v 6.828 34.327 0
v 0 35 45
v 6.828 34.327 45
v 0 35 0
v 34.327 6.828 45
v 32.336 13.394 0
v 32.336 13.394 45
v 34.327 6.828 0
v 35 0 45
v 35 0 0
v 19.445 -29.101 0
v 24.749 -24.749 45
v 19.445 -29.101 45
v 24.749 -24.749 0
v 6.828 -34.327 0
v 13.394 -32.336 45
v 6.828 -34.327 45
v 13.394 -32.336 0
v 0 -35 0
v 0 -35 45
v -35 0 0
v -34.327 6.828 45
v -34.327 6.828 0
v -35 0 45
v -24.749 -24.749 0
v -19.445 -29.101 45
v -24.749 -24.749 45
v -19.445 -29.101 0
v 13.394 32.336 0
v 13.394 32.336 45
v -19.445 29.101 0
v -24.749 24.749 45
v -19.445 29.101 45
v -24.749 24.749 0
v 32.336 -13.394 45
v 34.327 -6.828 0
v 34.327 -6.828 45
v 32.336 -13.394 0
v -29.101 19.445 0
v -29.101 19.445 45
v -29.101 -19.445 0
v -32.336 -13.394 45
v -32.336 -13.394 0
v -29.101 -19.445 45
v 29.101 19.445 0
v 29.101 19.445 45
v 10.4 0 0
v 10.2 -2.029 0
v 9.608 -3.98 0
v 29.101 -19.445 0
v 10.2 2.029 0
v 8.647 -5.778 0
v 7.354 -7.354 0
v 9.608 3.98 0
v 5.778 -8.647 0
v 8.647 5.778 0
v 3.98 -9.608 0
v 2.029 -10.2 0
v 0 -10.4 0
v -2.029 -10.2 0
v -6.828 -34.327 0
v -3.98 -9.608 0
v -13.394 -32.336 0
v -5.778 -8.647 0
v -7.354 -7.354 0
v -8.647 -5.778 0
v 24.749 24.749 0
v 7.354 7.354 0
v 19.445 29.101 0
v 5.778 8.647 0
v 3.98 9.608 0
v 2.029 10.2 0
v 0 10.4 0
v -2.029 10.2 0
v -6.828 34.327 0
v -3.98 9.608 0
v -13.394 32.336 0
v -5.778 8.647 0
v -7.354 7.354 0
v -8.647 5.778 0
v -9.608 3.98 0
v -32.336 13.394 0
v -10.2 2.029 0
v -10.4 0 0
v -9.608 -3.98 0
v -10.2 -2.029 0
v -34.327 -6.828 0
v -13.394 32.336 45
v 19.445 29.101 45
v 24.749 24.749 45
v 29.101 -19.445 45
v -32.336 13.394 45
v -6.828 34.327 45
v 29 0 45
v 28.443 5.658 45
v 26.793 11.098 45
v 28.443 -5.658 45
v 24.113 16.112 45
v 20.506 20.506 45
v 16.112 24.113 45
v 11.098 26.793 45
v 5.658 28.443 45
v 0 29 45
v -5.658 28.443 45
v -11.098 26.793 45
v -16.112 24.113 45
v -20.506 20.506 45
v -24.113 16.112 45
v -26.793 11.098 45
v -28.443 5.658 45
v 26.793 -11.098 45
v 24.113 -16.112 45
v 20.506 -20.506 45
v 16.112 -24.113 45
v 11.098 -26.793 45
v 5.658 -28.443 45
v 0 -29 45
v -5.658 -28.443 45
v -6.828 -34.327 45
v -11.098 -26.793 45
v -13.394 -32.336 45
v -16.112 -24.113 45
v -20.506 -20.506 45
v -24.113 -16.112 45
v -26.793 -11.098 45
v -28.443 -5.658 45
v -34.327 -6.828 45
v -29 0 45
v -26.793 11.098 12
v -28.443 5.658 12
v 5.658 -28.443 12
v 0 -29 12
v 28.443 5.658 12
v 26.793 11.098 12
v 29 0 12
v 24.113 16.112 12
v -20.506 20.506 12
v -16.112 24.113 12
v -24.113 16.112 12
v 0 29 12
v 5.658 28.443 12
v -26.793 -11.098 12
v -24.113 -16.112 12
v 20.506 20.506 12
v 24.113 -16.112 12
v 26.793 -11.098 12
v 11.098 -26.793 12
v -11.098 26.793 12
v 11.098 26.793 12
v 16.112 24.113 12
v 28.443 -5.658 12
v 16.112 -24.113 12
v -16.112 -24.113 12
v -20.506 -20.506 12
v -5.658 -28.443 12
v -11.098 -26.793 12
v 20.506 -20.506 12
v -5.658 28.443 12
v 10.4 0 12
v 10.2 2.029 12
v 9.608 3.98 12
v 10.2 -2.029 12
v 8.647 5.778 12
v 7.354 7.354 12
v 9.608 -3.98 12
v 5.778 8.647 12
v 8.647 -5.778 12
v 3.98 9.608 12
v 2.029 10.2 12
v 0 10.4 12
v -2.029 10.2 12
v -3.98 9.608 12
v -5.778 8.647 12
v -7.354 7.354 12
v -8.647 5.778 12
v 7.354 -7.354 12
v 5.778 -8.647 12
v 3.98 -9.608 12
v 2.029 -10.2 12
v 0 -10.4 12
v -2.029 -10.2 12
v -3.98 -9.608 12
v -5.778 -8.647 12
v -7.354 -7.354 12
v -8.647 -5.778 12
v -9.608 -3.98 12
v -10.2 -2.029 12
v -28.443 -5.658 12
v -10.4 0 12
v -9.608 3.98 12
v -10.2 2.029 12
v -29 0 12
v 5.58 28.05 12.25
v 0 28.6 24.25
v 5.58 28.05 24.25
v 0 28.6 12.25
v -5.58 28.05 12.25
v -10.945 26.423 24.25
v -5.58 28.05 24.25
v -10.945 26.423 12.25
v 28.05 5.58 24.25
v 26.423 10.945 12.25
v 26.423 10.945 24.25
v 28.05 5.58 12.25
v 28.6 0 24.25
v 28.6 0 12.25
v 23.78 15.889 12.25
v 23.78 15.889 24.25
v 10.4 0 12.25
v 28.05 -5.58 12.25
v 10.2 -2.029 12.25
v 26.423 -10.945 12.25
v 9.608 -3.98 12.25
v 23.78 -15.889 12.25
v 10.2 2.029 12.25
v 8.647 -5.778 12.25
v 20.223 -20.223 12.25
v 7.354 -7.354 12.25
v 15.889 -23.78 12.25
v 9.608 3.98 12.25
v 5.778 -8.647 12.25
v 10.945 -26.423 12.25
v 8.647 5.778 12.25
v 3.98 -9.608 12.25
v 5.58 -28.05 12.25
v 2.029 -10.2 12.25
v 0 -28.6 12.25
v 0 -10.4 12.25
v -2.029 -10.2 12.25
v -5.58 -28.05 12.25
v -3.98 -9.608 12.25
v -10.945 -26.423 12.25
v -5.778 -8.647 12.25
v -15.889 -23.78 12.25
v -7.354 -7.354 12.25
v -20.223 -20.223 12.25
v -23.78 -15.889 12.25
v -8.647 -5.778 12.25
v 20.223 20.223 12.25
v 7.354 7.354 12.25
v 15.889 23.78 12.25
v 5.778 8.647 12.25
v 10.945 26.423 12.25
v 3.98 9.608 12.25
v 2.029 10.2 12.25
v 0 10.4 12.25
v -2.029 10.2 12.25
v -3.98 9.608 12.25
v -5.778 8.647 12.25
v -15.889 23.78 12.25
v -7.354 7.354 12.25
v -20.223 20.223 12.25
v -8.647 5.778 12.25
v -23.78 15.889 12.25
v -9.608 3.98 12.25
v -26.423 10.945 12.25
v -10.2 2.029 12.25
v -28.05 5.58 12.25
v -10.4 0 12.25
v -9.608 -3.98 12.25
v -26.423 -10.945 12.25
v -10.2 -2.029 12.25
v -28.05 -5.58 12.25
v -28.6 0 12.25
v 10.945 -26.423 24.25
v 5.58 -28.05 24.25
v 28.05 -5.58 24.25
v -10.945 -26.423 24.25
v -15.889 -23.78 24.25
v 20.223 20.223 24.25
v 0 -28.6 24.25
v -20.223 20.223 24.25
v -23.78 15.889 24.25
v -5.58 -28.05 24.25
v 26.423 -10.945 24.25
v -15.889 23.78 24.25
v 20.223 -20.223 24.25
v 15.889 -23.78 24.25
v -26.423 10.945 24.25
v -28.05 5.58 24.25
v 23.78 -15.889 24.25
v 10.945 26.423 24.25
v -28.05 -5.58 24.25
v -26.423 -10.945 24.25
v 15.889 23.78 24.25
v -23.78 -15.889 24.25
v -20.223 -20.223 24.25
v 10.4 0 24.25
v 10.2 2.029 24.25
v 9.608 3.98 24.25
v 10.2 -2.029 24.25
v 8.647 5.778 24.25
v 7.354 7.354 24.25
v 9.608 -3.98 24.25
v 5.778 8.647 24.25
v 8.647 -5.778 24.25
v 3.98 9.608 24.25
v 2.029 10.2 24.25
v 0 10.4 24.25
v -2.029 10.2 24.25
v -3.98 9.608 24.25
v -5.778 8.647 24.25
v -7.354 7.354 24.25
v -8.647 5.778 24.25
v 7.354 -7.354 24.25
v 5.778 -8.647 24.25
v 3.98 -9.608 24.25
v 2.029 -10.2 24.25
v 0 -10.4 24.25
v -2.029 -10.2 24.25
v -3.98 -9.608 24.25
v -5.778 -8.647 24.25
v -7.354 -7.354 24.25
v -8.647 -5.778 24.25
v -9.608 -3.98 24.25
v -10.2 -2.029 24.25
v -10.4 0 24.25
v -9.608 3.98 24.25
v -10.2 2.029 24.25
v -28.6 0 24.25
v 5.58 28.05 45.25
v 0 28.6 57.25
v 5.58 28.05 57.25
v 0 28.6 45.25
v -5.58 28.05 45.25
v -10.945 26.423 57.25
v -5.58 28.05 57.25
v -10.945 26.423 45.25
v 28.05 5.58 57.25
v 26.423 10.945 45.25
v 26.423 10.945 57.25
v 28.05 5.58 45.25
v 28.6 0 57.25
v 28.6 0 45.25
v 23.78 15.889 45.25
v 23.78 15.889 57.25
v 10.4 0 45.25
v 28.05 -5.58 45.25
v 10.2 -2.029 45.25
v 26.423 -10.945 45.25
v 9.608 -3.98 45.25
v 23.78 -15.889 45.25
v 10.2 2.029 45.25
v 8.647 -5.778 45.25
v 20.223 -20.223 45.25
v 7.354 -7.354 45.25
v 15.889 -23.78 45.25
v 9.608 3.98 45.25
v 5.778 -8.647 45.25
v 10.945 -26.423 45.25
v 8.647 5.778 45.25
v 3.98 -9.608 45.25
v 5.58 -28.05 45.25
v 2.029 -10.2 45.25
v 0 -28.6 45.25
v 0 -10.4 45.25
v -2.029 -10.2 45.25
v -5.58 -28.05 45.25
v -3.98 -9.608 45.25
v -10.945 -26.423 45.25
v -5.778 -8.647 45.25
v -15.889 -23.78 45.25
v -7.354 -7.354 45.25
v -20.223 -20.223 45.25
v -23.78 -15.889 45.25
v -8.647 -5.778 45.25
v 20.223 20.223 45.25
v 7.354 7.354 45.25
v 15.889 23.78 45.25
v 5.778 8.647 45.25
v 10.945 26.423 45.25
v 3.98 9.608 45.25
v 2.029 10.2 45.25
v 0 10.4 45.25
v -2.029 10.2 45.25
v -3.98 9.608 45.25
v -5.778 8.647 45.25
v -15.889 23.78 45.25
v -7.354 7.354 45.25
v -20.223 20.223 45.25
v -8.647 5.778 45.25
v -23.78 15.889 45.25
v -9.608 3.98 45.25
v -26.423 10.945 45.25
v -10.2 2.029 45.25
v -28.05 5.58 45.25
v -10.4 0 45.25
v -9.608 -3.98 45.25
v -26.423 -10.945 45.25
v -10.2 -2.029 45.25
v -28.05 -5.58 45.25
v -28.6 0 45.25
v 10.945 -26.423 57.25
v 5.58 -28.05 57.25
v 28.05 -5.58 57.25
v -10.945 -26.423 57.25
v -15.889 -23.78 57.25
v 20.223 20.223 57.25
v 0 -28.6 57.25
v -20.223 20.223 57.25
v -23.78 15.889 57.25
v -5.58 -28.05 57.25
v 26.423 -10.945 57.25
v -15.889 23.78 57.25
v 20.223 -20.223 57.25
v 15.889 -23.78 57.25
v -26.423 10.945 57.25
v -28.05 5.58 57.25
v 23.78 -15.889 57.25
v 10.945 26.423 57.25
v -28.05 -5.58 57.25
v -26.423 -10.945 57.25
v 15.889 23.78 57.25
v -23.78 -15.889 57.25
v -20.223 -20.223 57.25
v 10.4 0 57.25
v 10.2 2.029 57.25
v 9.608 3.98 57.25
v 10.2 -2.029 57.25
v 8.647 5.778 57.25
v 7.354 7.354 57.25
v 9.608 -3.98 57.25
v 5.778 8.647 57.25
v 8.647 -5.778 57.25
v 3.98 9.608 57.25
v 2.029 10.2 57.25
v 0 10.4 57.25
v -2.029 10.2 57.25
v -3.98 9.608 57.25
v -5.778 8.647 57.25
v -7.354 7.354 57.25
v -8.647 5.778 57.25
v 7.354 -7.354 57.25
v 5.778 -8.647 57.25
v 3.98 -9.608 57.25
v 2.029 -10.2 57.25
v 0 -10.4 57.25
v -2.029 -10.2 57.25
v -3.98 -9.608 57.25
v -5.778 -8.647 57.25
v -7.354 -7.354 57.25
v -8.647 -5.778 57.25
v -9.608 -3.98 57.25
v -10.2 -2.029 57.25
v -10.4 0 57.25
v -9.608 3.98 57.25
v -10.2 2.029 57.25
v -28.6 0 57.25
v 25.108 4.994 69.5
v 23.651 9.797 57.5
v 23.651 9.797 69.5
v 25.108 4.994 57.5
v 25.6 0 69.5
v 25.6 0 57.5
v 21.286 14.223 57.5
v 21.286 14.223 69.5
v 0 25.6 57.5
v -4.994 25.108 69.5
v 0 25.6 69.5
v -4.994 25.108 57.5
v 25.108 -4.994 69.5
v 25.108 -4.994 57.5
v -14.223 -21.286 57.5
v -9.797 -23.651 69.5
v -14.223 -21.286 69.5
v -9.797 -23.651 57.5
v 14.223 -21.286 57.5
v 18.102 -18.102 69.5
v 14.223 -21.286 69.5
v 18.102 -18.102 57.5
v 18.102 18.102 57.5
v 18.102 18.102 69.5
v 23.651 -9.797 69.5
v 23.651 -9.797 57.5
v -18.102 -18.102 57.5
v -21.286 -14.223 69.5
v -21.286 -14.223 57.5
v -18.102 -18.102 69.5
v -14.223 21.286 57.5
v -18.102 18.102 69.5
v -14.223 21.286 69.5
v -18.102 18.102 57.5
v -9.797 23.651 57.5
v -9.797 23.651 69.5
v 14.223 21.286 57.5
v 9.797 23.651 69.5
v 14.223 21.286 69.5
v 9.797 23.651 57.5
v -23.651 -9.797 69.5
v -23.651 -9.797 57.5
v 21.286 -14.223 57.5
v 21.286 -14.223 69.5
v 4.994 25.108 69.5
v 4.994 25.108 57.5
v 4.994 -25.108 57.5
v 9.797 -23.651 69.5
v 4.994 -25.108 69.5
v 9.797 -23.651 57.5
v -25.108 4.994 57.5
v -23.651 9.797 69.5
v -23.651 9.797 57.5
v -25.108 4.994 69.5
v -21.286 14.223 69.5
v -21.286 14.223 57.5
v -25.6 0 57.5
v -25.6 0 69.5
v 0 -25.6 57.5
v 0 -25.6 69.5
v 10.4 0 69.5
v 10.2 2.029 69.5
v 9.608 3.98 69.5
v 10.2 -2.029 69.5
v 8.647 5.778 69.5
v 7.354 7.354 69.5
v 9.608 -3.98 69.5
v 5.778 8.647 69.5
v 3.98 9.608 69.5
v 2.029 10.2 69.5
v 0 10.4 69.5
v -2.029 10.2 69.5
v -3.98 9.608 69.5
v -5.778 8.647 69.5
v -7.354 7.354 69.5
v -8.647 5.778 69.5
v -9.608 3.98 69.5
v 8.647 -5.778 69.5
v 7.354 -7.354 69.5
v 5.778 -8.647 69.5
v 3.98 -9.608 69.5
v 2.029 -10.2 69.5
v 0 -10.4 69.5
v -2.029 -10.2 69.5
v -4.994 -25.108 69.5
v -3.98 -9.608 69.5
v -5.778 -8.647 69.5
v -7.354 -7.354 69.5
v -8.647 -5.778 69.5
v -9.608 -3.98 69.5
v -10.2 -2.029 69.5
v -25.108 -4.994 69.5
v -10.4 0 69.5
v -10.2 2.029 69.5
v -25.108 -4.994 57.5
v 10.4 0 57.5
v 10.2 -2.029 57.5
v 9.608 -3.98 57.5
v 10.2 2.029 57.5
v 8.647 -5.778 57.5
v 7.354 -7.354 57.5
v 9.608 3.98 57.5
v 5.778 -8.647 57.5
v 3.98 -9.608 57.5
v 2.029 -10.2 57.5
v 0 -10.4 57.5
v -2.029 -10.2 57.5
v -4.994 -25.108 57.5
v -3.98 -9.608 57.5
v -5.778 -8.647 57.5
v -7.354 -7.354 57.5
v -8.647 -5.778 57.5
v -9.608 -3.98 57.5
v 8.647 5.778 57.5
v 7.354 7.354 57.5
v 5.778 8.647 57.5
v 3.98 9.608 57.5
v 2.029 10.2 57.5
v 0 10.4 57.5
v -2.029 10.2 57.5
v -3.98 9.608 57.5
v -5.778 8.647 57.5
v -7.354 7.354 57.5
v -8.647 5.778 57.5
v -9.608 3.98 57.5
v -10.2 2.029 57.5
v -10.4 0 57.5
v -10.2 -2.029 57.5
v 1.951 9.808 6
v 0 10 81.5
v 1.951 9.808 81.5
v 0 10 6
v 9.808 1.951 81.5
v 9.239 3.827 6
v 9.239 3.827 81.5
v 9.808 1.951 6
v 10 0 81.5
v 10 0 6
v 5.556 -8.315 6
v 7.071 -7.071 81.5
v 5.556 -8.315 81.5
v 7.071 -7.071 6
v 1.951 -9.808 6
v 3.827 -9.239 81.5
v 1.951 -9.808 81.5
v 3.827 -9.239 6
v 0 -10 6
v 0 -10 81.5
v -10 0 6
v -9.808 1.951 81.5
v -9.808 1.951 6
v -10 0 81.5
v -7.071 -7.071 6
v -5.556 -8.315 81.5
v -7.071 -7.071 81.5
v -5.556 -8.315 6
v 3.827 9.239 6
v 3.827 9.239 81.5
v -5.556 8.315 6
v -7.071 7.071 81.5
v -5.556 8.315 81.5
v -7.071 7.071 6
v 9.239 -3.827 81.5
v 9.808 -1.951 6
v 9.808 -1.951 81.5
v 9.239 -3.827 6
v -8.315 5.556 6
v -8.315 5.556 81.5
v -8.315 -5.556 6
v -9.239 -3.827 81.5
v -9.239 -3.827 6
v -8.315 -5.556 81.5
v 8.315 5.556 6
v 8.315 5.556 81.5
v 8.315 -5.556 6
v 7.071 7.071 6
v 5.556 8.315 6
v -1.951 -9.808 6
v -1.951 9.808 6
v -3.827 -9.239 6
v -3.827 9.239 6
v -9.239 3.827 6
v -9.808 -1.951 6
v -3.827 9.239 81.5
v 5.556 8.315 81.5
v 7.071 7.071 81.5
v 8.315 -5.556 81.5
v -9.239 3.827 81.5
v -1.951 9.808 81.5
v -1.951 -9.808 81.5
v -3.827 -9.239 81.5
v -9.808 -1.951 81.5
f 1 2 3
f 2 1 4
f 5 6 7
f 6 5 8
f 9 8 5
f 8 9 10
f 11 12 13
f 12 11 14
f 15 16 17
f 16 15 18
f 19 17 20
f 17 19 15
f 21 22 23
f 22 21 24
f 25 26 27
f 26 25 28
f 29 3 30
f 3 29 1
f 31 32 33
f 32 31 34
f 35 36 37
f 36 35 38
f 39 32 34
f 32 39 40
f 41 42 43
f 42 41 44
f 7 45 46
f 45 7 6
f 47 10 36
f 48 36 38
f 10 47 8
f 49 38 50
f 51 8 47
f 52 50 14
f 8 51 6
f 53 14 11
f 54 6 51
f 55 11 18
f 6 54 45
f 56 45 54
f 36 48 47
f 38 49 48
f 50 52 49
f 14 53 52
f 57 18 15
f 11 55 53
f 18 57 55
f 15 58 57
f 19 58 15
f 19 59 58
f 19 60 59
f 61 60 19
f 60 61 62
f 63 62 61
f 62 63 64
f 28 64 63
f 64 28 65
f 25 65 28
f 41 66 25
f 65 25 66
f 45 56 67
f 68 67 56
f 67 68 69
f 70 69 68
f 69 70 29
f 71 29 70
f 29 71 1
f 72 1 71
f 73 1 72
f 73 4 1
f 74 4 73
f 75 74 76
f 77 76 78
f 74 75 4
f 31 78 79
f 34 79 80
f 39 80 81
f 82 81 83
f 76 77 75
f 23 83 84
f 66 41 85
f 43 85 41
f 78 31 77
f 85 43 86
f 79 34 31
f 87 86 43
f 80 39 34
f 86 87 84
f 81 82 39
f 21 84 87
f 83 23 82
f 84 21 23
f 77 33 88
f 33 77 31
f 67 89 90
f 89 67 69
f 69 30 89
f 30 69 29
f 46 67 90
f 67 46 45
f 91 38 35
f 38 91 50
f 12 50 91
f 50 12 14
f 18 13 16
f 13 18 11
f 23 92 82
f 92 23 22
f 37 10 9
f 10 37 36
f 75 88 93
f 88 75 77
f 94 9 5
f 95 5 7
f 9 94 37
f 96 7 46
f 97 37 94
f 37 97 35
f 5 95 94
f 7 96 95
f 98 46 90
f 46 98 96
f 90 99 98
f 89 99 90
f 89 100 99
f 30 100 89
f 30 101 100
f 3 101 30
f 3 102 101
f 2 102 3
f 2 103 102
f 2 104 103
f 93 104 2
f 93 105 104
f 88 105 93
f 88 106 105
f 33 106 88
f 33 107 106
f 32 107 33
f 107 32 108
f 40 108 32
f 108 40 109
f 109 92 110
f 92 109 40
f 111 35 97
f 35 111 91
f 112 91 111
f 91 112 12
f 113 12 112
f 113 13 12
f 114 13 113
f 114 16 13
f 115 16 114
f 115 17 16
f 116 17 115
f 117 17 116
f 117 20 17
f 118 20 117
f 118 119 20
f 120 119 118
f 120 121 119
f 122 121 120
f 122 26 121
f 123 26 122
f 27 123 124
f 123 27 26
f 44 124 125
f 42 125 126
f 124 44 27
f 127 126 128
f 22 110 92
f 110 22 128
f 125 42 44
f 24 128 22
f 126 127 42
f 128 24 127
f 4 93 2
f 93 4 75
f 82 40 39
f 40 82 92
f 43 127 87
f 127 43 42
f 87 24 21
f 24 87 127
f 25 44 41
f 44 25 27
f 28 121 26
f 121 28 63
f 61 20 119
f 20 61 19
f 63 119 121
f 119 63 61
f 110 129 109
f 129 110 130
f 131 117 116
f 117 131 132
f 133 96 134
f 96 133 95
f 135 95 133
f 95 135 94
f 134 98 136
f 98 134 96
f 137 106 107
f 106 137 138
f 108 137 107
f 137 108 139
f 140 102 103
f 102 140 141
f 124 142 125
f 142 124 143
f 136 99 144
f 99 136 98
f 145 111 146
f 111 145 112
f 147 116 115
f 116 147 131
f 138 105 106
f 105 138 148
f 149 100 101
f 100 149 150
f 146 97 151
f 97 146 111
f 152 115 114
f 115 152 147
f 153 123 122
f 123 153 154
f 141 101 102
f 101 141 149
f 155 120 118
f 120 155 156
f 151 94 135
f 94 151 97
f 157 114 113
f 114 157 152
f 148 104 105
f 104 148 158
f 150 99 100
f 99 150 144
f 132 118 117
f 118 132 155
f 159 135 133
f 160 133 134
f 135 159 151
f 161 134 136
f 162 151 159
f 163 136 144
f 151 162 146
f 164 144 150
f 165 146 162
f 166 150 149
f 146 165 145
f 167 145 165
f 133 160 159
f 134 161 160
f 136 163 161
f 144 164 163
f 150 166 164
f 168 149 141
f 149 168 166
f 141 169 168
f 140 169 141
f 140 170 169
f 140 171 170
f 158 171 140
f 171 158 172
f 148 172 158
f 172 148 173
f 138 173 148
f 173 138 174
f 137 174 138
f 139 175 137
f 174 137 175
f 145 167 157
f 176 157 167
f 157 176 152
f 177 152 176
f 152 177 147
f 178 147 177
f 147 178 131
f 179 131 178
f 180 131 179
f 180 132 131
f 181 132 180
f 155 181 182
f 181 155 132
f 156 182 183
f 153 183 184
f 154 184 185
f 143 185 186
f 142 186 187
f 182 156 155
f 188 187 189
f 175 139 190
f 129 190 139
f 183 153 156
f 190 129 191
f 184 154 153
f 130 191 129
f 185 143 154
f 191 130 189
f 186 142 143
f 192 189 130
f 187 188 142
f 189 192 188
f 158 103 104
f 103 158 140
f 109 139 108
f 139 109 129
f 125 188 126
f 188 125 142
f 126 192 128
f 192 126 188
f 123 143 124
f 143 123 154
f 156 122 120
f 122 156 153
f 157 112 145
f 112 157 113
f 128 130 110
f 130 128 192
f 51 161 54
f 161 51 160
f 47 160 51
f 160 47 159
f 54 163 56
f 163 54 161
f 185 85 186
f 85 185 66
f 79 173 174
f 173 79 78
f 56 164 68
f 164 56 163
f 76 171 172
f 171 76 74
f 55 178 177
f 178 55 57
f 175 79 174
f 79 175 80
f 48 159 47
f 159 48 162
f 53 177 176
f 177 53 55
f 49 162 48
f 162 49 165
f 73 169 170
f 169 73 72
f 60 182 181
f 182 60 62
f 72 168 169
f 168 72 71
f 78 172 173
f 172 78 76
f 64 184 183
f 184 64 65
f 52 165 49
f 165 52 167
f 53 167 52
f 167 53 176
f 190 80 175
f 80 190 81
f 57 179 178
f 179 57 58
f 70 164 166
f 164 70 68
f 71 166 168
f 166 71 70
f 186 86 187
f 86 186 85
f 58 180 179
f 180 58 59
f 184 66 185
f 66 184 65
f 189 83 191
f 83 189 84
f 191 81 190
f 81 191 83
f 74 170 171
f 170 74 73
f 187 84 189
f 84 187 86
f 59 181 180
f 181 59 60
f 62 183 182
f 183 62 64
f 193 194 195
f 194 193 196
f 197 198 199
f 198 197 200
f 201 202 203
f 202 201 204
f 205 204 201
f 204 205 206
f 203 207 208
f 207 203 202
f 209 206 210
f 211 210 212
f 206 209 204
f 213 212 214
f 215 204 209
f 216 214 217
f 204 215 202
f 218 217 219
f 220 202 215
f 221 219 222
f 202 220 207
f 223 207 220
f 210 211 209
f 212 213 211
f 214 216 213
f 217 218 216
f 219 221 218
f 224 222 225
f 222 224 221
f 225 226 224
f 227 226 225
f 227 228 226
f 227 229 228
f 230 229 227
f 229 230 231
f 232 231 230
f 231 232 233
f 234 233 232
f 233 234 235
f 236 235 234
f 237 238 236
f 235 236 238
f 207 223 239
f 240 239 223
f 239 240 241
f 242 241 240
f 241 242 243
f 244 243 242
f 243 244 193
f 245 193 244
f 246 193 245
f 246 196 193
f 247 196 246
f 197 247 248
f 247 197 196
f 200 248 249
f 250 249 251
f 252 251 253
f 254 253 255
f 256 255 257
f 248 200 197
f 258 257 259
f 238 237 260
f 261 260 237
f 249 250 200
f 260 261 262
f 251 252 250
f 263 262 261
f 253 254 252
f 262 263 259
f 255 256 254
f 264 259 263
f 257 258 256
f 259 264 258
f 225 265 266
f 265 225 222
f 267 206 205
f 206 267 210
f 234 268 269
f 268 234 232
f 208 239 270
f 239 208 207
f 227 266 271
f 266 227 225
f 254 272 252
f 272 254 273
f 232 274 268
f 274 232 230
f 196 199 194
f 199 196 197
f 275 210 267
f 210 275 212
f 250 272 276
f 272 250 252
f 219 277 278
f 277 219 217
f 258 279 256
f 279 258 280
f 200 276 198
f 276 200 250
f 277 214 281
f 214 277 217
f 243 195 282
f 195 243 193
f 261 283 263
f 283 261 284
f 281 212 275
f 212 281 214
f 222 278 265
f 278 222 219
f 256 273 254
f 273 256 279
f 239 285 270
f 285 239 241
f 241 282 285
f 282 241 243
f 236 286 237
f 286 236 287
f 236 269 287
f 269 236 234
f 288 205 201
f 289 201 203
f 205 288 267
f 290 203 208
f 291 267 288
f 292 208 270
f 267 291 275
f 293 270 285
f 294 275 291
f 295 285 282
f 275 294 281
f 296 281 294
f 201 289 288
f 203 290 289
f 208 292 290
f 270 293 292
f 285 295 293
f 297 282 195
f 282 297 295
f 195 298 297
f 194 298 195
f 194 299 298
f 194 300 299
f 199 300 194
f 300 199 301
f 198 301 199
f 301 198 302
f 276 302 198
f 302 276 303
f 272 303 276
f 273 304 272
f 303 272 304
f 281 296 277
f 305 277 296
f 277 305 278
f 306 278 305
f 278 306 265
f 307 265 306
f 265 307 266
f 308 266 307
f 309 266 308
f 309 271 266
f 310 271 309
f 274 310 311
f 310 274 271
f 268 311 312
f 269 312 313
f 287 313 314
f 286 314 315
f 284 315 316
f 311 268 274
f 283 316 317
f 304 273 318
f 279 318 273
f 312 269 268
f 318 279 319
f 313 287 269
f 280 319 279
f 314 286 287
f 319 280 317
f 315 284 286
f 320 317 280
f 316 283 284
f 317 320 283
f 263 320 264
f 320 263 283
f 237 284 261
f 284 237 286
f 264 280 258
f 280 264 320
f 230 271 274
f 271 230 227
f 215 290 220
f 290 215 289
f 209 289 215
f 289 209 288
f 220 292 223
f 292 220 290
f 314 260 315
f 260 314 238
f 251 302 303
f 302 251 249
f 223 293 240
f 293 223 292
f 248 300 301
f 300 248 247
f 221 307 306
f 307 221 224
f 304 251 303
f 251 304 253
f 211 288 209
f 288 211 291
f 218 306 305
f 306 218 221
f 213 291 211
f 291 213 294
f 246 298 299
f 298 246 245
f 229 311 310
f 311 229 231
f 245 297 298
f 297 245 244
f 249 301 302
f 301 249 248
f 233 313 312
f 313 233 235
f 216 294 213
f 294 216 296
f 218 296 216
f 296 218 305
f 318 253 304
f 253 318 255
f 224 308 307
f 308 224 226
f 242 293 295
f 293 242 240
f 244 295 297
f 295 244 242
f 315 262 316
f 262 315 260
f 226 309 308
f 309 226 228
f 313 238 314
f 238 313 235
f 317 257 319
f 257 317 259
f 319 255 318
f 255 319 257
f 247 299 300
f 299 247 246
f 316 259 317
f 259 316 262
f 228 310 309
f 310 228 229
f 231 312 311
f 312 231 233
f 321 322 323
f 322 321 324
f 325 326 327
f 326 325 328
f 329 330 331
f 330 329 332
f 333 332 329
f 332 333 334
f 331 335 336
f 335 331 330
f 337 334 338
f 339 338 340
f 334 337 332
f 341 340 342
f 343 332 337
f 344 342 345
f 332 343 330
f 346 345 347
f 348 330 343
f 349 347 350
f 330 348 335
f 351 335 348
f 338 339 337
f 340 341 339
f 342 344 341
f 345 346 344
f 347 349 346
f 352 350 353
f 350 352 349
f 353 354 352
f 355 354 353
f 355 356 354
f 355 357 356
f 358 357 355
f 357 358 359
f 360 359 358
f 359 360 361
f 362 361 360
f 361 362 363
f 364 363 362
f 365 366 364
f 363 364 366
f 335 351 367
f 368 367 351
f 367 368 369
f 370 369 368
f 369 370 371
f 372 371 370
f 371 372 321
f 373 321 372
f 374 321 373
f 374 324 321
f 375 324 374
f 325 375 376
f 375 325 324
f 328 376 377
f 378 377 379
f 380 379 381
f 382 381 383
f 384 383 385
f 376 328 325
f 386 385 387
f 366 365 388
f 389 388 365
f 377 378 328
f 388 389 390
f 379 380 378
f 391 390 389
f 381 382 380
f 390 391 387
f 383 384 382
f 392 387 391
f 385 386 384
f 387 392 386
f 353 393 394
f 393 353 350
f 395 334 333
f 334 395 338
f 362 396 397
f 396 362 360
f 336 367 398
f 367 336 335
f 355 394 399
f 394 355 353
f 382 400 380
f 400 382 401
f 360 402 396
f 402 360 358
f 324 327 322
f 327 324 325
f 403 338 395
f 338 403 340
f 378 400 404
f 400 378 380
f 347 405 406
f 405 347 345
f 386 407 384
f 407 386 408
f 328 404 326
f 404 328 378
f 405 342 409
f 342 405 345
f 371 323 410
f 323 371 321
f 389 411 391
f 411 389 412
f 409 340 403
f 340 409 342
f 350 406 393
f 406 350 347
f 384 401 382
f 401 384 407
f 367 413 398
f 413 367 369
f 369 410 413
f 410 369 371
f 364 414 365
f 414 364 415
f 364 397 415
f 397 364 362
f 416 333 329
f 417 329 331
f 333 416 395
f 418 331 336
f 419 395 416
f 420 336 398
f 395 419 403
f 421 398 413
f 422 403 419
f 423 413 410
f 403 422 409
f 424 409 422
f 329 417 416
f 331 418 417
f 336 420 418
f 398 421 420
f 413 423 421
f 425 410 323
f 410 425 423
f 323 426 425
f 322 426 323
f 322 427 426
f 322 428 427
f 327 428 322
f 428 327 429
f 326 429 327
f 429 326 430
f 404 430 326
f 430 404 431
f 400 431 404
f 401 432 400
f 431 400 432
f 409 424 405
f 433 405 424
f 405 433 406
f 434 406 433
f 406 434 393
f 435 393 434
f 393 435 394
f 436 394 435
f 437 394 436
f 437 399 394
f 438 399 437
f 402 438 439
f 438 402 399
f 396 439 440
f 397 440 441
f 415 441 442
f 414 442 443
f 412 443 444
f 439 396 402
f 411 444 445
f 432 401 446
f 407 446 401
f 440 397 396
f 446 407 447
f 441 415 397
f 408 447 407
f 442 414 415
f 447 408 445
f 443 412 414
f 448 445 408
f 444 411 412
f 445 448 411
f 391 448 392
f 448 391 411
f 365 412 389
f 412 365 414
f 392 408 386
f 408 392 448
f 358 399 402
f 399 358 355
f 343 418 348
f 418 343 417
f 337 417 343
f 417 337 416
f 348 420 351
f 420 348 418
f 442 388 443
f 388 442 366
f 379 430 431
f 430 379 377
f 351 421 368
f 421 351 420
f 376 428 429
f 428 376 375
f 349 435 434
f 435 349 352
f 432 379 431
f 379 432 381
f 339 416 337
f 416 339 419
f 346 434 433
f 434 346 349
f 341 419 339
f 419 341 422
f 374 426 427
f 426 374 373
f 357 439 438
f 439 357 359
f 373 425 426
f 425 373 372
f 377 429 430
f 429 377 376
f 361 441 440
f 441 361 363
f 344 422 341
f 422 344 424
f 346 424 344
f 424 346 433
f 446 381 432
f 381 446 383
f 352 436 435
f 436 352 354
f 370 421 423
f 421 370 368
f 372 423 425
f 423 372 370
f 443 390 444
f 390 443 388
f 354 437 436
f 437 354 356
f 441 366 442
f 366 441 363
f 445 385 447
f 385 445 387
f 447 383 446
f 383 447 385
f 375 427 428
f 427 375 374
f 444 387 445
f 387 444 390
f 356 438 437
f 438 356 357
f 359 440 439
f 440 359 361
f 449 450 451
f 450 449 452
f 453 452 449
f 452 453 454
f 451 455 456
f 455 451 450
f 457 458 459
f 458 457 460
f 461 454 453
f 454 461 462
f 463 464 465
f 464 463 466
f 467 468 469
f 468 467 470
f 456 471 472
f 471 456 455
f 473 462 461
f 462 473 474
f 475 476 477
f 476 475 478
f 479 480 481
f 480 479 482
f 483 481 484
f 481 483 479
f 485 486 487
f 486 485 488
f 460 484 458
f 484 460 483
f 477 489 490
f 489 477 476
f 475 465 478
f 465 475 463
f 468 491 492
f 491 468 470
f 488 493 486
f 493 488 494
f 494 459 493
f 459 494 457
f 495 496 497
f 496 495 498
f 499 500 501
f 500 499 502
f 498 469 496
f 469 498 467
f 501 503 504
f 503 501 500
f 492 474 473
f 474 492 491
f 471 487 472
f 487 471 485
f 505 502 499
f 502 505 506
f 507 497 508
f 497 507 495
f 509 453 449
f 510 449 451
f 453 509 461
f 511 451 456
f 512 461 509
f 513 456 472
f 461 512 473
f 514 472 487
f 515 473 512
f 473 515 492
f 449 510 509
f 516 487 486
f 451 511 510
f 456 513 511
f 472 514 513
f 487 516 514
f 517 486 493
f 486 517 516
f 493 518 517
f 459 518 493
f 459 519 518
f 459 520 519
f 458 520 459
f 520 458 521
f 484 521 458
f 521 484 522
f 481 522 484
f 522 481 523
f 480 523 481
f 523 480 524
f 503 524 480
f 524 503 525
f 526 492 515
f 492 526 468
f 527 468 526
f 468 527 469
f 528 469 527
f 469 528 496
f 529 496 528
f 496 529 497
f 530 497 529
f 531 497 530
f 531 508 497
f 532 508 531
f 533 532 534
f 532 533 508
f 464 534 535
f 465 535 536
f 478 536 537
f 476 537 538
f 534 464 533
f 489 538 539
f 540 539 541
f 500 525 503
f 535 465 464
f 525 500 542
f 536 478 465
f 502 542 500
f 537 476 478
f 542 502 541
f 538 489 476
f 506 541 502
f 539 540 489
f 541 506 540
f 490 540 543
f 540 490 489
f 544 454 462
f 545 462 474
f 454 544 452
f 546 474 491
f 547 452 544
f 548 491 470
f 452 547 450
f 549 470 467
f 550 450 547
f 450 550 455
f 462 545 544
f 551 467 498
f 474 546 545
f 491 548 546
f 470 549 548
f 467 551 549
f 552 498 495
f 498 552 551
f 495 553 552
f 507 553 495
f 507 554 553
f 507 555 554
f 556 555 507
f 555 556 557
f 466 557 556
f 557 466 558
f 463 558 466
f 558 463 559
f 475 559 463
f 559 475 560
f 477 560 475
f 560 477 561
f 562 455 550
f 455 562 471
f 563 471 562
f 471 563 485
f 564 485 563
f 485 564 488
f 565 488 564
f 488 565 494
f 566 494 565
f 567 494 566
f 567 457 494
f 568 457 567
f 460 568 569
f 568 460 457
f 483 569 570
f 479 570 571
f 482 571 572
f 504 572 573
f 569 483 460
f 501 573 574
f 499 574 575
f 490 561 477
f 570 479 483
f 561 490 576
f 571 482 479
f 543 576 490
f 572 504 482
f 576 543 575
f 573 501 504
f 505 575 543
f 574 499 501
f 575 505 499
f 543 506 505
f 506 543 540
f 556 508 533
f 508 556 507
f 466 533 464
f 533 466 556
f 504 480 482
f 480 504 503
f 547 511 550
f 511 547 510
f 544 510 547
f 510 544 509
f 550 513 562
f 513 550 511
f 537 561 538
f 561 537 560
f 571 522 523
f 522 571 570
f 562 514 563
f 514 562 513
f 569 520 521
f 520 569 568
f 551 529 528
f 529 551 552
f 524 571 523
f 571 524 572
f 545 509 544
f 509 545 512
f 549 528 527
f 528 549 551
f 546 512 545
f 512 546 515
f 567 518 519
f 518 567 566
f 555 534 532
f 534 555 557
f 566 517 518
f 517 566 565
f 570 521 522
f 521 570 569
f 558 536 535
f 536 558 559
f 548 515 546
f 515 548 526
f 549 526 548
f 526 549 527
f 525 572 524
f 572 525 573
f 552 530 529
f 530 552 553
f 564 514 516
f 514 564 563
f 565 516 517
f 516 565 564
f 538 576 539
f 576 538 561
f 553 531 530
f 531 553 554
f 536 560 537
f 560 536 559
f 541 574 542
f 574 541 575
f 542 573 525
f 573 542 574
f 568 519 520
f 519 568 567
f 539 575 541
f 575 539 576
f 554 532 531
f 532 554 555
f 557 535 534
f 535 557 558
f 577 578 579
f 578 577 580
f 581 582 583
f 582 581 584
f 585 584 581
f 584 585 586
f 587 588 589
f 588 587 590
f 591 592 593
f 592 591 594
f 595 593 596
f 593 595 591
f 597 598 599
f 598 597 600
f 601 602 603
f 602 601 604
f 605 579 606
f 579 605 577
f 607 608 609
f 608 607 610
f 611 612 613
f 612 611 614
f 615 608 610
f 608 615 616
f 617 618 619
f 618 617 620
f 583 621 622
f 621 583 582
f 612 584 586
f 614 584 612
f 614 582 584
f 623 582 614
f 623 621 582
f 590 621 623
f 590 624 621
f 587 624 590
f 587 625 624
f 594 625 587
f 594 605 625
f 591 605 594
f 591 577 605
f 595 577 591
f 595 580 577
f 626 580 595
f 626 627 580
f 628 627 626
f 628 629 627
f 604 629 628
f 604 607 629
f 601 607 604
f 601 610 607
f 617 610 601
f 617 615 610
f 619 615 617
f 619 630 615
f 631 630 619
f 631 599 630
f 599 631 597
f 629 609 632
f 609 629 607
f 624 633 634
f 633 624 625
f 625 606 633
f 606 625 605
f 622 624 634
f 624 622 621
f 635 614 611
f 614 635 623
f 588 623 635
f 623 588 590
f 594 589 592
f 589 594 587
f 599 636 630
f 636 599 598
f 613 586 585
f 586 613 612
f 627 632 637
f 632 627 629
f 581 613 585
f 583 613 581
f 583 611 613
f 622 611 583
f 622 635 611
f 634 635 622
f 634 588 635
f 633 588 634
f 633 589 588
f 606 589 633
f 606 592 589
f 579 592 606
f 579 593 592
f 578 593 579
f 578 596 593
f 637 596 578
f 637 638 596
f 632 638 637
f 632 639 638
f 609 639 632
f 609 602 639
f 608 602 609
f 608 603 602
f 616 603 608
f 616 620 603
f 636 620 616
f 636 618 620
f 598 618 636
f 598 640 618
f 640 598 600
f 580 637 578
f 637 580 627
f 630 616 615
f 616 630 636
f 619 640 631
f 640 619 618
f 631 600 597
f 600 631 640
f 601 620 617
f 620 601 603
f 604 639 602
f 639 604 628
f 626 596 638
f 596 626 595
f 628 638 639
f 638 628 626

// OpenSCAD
$fn = 32;

// ------------------------------------------------------------------------
// Bearing housing: housing d70, two bearings and a shaft
// Every part is its own module, assembly() places them once.
// ------------------------------------------------------------------------

// --- part 1 ---
module housing() {
  difference() {
    cylinder(h = 45, d = 70);
    translate([0, 0, 12]) cylinder(h = 34, d = 58);
    translate([0, 0, -1]) cylinder(h = 14, d = 20.8);
  }
}

// --- part 2 ---
module bearing_lower() {
  difference() {
      translate([0, 0, 0]) cylinder(h = 12, d = 57.2);
      translate([0, 0, -1]) cylinder(h = 14, d = 20.8);
    }
}

// --- part 3 ---
module bearing_upper() {
  difference() {
      translate([0, 0, 0]) cylinder(h = 12, d = 57.2);
      translate([0, 0, -1]) cylinder(h = 14, d = 20.8);
    }
}

// --- part 4 ---
module spacer() {
  difference() {
      translate([0, 0, 0]) cylinder(h = 12, d = 51.2);
      translate([0, 0, -1]) cylinder(h = 14, d = 20.8);
    }
}

// --- part 5 ---
module shaft() {
  translate([0, 0, -37.75]) cylinder(h = 75.5, d = 20);
}

// --- assembly ---
module assembly() {
  translate([0, 0, 0]) rotate([0, 0, 0]) housing();
  translate([0, 0, 12.25]) rotate([0, 0, 0]) bearing_lower();
  translate([0, 0, 45.25]) rotate([0, 0, 0]) bearing_upper();
  translate([0, 0, 57.5]) rotate([0, 0, 0]) spacer();
  translate([0, 0, 43.75]) rotate([0, 0, 0]) shaft();
}

assembly();
